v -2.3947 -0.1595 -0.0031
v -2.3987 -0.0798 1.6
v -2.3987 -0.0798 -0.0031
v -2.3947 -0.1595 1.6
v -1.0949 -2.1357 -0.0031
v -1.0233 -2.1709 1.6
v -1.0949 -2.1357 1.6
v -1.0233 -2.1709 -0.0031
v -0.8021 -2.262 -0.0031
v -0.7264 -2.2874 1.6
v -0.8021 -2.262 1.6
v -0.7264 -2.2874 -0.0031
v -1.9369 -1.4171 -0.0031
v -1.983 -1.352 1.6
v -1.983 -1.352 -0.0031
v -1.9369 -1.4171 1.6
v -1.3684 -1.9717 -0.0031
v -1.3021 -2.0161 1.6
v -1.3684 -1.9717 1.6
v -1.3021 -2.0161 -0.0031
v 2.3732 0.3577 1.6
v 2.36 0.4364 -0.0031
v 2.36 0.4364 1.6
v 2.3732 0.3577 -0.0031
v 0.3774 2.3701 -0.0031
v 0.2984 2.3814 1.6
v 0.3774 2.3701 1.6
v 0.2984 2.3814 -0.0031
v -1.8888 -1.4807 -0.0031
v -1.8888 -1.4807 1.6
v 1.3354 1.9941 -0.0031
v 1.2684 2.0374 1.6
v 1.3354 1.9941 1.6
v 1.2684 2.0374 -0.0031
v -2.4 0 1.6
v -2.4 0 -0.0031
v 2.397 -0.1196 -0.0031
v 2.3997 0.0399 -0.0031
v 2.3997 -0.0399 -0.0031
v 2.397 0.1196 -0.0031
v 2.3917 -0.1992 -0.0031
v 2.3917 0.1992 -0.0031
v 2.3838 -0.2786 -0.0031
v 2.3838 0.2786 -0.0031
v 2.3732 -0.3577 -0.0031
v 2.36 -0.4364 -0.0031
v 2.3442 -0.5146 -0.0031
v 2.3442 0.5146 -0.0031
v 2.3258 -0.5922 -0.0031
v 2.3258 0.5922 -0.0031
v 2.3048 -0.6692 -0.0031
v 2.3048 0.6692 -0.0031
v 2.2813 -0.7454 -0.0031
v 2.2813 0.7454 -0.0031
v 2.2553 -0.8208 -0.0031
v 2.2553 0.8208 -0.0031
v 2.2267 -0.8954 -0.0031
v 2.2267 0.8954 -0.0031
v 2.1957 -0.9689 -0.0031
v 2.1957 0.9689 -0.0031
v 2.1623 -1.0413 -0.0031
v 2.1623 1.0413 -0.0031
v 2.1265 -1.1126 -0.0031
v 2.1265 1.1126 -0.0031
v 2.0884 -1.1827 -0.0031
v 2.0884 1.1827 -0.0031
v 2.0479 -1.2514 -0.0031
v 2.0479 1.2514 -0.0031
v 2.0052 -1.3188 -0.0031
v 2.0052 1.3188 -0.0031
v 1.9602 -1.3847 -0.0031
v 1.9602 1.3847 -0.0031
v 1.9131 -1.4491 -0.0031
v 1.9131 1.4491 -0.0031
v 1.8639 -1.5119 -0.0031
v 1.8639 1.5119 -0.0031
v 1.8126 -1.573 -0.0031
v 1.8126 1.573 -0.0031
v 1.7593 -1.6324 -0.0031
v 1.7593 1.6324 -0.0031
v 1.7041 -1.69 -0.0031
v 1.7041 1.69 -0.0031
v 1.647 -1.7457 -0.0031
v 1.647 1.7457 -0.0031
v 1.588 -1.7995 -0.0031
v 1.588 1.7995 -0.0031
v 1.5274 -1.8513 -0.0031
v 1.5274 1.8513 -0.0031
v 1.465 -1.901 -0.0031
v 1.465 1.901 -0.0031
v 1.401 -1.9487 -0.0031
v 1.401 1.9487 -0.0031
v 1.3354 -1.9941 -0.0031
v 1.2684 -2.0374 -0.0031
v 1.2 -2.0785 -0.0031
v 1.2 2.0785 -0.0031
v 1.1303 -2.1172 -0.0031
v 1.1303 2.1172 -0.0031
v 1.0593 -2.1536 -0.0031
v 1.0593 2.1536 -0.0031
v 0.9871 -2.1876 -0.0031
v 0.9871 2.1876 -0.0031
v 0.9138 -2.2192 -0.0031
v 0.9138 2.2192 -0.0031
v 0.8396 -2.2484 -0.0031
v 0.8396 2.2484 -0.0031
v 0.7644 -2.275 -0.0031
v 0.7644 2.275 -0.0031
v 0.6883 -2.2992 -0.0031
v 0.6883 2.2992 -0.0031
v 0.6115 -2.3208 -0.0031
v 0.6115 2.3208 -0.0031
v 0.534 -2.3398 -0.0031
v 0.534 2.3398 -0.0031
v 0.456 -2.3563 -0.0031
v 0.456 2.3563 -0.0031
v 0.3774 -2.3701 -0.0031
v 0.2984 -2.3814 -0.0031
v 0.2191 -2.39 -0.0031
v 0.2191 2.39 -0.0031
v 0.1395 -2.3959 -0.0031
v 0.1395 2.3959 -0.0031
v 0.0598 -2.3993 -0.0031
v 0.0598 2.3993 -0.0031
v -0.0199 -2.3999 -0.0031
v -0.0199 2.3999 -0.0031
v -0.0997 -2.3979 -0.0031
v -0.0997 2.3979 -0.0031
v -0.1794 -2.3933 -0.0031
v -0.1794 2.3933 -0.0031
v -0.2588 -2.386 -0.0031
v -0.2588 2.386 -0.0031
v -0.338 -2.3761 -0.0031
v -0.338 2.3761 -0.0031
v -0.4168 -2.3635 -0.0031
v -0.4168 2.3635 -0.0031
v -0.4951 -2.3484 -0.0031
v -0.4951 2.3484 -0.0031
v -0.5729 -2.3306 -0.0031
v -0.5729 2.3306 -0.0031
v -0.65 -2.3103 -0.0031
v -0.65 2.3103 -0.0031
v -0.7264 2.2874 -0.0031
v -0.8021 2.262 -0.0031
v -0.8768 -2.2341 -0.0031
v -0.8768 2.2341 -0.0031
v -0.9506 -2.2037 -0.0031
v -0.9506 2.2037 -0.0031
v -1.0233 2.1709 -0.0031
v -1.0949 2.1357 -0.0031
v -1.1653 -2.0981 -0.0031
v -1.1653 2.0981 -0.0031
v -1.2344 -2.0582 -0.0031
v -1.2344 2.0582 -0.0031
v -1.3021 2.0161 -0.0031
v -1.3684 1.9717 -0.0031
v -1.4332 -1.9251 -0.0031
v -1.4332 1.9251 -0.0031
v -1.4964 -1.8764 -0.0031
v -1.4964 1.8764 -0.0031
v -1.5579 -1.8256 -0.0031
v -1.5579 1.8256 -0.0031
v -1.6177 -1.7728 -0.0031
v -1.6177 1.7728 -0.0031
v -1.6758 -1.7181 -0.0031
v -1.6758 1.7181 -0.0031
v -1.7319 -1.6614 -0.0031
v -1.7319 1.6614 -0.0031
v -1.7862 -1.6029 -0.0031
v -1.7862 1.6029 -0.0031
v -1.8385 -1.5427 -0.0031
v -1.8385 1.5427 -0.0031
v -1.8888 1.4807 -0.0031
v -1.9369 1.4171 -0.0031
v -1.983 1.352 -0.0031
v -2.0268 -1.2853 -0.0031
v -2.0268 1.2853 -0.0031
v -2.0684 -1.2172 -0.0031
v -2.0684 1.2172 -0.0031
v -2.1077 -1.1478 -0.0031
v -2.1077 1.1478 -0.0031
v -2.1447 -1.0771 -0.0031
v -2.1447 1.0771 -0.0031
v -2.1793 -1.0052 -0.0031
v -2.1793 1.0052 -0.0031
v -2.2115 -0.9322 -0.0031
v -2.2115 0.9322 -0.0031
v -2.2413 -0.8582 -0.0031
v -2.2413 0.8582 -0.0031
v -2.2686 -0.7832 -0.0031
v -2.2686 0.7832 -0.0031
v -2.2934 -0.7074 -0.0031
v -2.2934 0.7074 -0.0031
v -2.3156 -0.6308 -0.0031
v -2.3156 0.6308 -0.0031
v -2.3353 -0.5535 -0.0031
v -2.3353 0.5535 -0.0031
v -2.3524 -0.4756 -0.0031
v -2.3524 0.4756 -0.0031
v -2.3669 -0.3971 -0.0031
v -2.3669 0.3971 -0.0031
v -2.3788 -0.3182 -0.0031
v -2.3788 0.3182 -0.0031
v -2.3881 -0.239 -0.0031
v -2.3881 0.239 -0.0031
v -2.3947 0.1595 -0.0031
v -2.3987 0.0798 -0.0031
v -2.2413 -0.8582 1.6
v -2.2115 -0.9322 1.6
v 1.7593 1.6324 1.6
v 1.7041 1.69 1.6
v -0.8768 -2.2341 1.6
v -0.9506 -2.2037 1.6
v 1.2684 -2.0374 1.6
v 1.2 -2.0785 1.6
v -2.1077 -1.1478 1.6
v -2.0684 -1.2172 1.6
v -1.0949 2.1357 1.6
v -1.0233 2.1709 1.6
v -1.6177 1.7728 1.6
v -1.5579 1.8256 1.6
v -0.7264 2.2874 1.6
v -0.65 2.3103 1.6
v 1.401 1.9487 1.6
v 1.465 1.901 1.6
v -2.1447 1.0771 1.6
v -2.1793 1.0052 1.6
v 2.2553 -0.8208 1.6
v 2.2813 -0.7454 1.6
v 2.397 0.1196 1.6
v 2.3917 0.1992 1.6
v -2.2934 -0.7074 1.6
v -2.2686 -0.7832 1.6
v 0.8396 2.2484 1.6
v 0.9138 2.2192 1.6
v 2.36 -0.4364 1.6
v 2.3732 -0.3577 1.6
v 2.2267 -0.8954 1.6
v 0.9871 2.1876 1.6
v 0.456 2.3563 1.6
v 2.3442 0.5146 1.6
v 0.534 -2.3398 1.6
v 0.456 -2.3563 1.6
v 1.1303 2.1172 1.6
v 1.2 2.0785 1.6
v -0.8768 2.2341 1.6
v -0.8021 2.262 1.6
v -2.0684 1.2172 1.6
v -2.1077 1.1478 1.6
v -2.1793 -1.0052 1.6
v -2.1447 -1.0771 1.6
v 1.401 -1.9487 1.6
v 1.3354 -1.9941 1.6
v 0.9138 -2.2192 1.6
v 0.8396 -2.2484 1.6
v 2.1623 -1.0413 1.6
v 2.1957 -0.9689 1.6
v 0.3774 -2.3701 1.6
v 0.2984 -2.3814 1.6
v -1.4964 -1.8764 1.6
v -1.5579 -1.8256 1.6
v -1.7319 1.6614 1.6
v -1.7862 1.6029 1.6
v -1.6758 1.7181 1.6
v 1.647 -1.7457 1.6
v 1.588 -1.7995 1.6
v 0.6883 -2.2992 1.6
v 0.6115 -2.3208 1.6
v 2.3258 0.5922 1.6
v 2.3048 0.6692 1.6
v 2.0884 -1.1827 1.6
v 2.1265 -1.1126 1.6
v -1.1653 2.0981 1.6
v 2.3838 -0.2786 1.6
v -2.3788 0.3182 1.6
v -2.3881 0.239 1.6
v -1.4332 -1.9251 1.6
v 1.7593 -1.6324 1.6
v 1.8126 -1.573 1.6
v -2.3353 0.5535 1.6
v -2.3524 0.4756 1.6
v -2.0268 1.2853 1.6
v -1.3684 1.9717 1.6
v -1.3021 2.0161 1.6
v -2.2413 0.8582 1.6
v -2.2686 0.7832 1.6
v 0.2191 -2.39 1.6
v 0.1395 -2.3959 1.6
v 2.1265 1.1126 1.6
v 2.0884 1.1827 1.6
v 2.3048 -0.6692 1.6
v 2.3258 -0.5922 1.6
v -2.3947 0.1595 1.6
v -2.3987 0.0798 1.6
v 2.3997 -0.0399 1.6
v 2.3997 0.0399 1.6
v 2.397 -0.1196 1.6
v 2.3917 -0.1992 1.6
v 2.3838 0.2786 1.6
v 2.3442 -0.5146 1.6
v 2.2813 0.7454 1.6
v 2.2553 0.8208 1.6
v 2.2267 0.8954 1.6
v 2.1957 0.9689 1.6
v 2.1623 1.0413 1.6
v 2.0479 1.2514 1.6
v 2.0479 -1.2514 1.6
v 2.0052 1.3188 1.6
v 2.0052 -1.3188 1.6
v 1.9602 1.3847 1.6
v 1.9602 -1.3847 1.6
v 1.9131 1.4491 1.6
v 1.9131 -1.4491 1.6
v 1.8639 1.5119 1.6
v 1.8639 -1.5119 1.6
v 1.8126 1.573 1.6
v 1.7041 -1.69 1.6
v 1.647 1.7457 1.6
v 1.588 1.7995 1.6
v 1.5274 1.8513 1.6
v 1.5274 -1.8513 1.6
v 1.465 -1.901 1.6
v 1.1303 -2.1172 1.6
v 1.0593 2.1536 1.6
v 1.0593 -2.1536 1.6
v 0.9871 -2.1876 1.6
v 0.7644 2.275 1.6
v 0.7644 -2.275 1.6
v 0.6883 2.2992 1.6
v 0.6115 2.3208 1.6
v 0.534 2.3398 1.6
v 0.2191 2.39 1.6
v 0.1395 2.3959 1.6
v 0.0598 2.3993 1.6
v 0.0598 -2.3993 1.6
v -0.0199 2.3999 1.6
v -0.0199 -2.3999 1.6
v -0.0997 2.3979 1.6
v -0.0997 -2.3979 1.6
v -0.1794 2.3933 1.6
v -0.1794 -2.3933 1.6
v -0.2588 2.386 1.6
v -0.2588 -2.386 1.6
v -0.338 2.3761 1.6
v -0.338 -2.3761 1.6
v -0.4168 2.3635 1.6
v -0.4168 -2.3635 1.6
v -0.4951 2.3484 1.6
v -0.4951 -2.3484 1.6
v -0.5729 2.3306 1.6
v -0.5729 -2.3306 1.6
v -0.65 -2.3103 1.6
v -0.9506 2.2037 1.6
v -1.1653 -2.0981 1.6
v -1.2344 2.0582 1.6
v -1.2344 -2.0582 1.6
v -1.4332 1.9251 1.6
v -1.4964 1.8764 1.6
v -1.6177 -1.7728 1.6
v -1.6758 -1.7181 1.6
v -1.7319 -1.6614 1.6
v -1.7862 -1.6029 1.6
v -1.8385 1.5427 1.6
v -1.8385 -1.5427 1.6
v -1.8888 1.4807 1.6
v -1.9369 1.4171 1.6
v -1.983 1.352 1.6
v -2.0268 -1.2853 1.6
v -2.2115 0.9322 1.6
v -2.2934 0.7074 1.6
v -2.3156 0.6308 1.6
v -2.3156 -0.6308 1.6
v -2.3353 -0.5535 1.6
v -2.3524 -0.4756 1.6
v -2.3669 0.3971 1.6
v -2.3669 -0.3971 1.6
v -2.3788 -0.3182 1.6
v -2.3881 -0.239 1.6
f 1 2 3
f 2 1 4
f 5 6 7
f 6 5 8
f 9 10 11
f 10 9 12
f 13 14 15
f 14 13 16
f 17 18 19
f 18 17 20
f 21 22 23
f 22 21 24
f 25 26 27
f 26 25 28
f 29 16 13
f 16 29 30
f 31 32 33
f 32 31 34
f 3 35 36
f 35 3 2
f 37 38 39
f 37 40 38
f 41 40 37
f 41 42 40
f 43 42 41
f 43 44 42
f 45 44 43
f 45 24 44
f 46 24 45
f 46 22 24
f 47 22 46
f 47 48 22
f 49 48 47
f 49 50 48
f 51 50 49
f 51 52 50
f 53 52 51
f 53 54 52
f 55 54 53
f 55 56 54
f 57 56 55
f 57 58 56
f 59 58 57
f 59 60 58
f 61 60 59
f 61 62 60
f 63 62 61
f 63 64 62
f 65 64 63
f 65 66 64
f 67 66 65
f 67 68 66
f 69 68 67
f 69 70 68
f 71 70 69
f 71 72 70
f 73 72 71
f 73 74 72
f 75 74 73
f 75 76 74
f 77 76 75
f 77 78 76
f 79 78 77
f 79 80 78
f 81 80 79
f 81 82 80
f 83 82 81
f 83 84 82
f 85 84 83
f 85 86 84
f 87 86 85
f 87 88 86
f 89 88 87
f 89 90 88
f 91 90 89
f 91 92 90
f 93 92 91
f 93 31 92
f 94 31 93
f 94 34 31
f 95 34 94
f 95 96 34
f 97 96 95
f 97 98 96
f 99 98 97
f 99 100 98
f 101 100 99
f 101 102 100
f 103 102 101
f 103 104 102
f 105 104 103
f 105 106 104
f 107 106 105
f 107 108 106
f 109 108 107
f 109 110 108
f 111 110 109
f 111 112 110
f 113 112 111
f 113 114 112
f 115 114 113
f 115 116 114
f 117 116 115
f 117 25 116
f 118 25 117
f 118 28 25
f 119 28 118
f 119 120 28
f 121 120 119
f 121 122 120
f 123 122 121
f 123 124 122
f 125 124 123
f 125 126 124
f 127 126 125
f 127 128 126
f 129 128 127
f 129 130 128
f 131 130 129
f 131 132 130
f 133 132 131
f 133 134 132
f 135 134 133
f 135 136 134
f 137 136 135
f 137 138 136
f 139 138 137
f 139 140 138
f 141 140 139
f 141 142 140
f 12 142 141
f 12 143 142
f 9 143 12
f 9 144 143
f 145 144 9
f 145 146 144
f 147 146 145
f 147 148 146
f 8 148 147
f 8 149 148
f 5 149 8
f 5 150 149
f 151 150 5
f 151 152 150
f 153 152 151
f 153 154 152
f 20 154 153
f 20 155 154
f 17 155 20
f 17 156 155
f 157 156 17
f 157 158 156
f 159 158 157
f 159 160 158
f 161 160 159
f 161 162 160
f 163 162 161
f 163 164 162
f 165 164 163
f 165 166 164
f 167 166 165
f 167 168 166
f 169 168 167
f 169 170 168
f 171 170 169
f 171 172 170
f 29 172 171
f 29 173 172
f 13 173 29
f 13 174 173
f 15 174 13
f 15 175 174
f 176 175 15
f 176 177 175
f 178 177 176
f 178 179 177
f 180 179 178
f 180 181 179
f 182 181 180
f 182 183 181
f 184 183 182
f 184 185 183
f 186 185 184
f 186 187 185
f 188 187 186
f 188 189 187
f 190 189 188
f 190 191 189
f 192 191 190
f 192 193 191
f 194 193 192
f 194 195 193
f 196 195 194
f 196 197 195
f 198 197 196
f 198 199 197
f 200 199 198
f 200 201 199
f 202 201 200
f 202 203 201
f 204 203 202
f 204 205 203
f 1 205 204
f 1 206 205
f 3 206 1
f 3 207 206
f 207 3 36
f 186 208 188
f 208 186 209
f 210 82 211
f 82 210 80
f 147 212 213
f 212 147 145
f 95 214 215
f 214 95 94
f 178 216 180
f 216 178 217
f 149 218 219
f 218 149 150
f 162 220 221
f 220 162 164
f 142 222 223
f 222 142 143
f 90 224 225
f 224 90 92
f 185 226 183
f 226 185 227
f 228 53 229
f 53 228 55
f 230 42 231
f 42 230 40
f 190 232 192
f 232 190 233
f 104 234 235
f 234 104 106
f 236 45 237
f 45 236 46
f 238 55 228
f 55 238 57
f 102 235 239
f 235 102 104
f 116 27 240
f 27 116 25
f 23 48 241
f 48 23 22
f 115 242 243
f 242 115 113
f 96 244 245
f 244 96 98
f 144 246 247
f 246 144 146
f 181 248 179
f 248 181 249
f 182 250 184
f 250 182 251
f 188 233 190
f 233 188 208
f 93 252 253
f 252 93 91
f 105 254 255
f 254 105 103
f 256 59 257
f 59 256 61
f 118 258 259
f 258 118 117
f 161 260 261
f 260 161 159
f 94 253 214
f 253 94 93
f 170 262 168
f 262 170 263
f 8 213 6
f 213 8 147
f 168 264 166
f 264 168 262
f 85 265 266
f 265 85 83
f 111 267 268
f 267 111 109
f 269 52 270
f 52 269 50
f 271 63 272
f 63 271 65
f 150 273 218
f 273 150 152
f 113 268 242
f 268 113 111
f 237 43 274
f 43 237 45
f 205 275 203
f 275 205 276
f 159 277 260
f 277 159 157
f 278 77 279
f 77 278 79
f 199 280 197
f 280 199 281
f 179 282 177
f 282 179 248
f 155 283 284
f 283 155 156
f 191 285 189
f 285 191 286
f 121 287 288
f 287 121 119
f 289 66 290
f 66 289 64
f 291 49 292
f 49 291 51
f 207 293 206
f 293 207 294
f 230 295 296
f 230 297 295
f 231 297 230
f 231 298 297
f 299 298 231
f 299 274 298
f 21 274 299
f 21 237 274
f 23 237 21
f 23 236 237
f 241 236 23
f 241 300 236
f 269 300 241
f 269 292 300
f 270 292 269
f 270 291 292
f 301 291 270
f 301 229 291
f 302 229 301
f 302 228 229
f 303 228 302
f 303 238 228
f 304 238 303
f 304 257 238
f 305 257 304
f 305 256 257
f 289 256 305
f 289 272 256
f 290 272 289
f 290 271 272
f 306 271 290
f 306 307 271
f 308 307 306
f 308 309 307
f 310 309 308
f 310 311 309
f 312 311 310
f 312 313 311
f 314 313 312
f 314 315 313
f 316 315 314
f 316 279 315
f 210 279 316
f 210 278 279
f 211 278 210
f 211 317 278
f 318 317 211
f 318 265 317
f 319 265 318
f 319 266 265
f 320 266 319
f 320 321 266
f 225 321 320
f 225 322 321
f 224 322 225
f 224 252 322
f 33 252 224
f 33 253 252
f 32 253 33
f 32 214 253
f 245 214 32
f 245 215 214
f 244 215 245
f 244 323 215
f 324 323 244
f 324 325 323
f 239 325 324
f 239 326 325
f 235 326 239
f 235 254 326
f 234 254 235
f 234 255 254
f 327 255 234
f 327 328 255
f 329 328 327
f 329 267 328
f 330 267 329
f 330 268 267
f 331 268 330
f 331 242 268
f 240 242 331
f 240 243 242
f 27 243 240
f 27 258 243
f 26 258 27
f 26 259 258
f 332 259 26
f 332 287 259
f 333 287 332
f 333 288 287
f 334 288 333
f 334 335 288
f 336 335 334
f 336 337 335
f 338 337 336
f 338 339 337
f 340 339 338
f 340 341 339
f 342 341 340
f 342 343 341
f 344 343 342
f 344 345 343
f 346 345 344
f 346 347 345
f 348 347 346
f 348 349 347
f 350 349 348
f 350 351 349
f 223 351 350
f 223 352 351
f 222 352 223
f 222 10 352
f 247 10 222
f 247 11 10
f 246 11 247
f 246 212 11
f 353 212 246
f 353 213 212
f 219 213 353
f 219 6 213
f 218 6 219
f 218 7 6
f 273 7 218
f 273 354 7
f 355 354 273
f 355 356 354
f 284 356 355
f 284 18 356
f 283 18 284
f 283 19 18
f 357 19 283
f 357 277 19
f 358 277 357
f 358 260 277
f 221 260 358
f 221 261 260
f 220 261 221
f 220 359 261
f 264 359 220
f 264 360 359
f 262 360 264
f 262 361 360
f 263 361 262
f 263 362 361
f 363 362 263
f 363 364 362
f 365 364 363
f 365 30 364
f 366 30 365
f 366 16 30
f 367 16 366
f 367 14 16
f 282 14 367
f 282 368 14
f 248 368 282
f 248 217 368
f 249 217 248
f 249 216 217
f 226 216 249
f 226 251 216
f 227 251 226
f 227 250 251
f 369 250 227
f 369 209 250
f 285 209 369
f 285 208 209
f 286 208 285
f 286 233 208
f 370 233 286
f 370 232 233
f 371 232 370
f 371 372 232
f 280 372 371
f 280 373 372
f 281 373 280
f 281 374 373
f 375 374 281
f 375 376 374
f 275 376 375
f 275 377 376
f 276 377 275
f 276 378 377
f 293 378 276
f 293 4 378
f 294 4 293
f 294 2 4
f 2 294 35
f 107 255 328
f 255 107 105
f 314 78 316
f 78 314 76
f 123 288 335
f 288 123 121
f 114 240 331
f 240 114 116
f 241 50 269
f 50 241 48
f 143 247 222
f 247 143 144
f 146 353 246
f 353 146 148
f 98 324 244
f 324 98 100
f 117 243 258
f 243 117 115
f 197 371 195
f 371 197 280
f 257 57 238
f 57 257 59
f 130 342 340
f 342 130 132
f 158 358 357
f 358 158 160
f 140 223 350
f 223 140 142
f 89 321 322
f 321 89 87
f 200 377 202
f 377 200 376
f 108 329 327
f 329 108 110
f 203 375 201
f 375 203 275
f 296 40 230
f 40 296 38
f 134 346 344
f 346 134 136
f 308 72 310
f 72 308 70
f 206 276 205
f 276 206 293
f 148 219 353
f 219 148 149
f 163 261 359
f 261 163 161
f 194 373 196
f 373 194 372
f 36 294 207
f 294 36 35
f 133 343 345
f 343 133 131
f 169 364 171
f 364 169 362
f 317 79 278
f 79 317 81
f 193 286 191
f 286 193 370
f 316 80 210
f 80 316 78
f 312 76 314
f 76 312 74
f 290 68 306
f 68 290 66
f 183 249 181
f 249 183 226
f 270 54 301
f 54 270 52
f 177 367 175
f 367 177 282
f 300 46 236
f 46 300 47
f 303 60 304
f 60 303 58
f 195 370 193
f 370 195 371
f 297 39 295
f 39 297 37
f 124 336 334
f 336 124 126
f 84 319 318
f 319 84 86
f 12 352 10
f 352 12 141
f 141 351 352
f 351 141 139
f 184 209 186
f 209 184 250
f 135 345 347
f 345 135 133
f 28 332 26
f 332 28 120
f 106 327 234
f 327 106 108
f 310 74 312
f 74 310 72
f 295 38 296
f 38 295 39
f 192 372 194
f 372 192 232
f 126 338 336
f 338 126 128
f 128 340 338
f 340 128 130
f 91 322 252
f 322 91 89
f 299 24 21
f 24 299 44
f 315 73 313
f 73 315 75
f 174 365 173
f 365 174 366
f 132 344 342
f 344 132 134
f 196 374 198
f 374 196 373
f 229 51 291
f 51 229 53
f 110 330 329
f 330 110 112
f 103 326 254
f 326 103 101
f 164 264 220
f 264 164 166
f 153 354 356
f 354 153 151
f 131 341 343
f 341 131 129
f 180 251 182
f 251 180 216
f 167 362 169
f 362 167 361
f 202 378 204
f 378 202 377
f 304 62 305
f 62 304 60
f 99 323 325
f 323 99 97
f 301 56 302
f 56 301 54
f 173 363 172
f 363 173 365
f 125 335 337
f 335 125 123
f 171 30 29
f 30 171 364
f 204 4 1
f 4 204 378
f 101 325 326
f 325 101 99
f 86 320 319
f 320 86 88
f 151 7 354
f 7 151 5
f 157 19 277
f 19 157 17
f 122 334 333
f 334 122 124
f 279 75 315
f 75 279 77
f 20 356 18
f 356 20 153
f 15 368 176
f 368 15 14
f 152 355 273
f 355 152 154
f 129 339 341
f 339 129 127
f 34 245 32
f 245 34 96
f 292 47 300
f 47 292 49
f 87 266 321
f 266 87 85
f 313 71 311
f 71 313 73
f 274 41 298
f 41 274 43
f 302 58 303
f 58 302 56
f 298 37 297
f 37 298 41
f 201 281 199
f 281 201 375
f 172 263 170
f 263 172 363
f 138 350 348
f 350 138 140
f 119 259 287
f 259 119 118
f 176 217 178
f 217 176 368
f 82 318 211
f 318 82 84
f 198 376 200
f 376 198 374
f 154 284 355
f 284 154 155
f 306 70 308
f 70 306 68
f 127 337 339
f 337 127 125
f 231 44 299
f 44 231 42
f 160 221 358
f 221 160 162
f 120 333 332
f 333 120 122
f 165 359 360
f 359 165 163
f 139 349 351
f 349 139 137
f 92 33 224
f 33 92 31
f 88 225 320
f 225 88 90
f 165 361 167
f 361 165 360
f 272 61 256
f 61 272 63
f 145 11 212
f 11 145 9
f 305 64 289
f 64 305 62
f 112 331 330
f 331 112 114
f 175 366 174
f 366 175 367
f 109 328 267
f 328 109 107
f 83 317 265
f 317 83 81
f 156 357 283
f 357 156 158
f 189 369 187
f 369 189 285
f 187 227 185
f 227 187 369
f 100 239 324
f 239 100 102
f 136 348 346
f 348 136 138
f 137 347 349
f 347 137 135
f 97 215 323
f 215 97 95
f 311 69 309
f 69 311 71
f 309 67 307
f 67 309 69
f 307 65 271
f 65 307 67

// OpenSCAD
// file: ../p/4-4edge.scad
use <../lib.scad>
$fa=1; $fs=0.2;
function ldraw_lib__4_4edge(realsolid=false) = [
// 0 Circle 1.0
// 0 Name: 4-4edge.dat
// 0 Author: James Jessiman
// 0 !LDRAW_ORG Primitive UPDATE 2017-01
// 0 !LICENSE Licensed under CC BY 2.0 and CC BY 4.0 : see CAreadme.txt
// 
// 0 BFC CERTIFY CCW
  [0,"BFC","CERTIFY"],
  [0,"BFC","CCW"],
// 
// 0 !HISTORY 1998-12-15 [PTadmin] Official Update 1998-10
// 0 !HISTORY 2005-12-28 [PTadmin] Official Update 2005-01
// 0 !HISTORY 2007-06-24 [PTadmin] Header formatted for Contributor Agreement
// 0 !HISTORY 2008-07-01 [PTadmin] Official Update 2008-01
// 0 !HISTORY 2017-01-15 [Steffen] BFCed
// 0 !HISTORY 2017-12-30 [PTadmin] Official Update 2017-01
// 
// 
// 2 24 1 0 0 0.9239 0 0.3827
  [2,24,1,0,0,0.9239,0,0.3827],
// 2 24 0.9239 0 0.3827 0.7071 0 0.7071
  [2,24,0.9239,0,0.3827,0.7071,0,0.7071],
// 2 24 0.7071 0 0.7071 0.3827 0 0.9239
  [2,24,0.7071,0,0.7071,0.3827,0,0.9239],
// 2 24 0.3827 0 0.9239 0 0 1
  [2,24,0.3827,0,0.9239,0,0,1],
// 2 24 0 0 1 -0.3827 0 0.9239
  [2,24,0,0,1,-0.3827,0,0.9239],
// 2 24 -0.3827 0 0.9239 -0.7071 0 0.7071
  [2,24,-0.3827,0,0.9239,-0.7071,0,0.7071],
// 2 24 -0.7071 0 0.7071 -0.9239 0 0.3827
  [2,24,-0.7071,0,0.7071,-0.9239,0,0.3827],
// 2 24 -0.9239 0 0.3827 -1 0 -0
  [2,24,-0.9239,0,0.3827,-1,0,-0],
// 2 24 -1 0 -0 -0.9239 0 -0.3827
  [2,24,-1,0,-0,-0.9239,0,-0.3827],
// 2 24 -0.9239 0 -0.3827 -0.7071 0 -0.7071
  [2,24,-0.9239,0,-0.3827,-0.7071,0,-0.7071],
// 2 24 -0.7071 0 -0.7071 -0.3827 0 -0.9239
  [2,24,-0.7071,0,-0.7071,-0.3827,0,-0.9239],
// 2 24 -0.3827 0 -0.9239 0 0 -1
  [2,24,-0.3827,0,-0.9239,0,0,-1],
// 2 24 0 0 -1 0.3827 0 -0.9239
  [2,24,0,0,-1,0.3827,0,-0.9239],
// 2 24 0.3827 0 -0.9239 0.7071 0 -0.7071
  [2,24,0.3827,0,-0.9239,0.7071,0,-0.7071],
// 2 24 0.7071 0 -0.7071 0.9239 0 -0.3827
  [2,24,0.7071,0,-0.7071,0.9239,0,-0.3827],
// 2 24 0.9239 0 -0.3827 1 0 0
  [2,24,0.9239,0,-0.3827,1,0,0],
];
module ldraw_lib__4_4edge(step=0, col=false, unit=2/5, alt=false, line=0.2, solid=!$preview)
    makepoly(ldraw_lib__4_4edge(solid), step=step, col=col, unit=unit, alt=alt, line=line, solid=solid);
ldraw_lib__4_4edge(line=0.2);
// file: ../p/4-4disc.scad
use <../lib.scad>
$fa=1; $fs=0.2;
function ldraw_lib__4_4disc(realsolid=false) = [
// 0 Disc 1.0
// 0 Name: 4-4disc.dat
// 0 Author: James Jessiman
// 0 !LDRAW_ORG Primitive UPDATE 2002-02
// 0 !LICENSE Licensed under CC BY 2.0 and CC BY 4.0 : see CAreadme.txt
// 
// 0 BFC CERTIFY CCW
  [0,"BFC","CERTIFY"],
  [0,"BFC","CCW"],
// 
// 0 !HISTORY 1998-12-15 [PTadmin] Official Update 1998-10
// 0 !HISTORY 2002-03-23 [sbliss] Added BFC statement
// 0 !HISTORY 2002-04-25 [PTadmin] Official Update 2002-02
// 0 !HISTORY 2007-06-24 [PTadmin] Header formatted for Contributor Agreement
// 0 !HISTORY 2008-07-01 [PTadmin] Official Update 2008-01
// 
// 
// 3 16 0 0 0 1 0 0 0.9239 0 0.3827
  [3,16,0,0,0,1,0,0,0.9239,0,0.3827],
// 3 16 0 0 0 0.9239 0 0.3827 0.7071 0 0.7071
  [3,16,0,0,0,0.9239,0,0.3827,0.7071,0,0.7071],
// 3 16 0 0 0 0.7071 0 0.7071 0.3827 0 0.9239
  [3,16,0,0,0,0.7071,0,0.7071,0.3827,0,0.9239],
// 3 16 0 0 0 0.3827 0 0.9239 0 0 1
  [3,16,0,0,0,0.3827,0,0.9239,0,0,1],
// 3 16 0 0 0 0 0 1 -0.3827 0 0.9239
  [3,16,0,0,0,0,0,1,-0.3827,0,0.9239],
// 3 16 0 0 0 -0.3827 0 0.9239 -0.7071 0 0.7071
  [3,16,0,0,0,-0.3827,0,0.9239,-0.7071,0,0.7071],
// 3 16 0 0 0 -0.7071 0 0.7071 -0.9239 0 0.3827
  [3,16,0,0,0,-0.7071,0,0.7071,-0.9239,0,0.3827],
// 3 16 0 0 0 -0.9239 0 0.3827 -1 0 -0
  [3,16,0,0,0,-0.9239,0,0.3827,-1,0,-0],
// 3 16 0 0 0 -1 0 -0 -0.9239 0 -0.3827
  [3,16,0,0,0,-1,0,-0,-0.9239,0,-0.3827],
// 3 16 0 0 0 -0.9239 0 -0.3827 -0.7071 0 -0.7071
  [3,16,0,0,0,-0.9239,0,-0.3827,-0.7071,0,-0.7071],
// 3 16 0 0 0 -0.7071 0 -0.7071 -0.3827 0 -0.9239
  [3,16,0,0,0,-0.7071,0,-0.7071,-0.3827,0,-0.9239],
// 3 16 0 0 0 -0.3827 0 -0.9239 0 0 -1
  [3,16,0,0,0,-0.3827,0,-0.9239,0,0,-1],
// 3 16 0 0 0 0 0 -1 0.3827 0 -0.9239
  [3,16,0,0,0,0,0,-1,0.3827,0,-0.9239],
// 3 16 0 0 0 0.3827 0 -0.9239 0.7071 0 -0.7071
  [3,16,0,0,0,0.3827,0,-0.9239,0.7071,0,-0.7071],
// 3 16 0 0 0 0.7071 0 -0.7071 0.9239 0 -0.3827
  [3,16,0,0,0,0.7071,0,-0.7071,0.9239,0,-0.3827],
// 3 16 0 0 0 0.9239 0 -0.3827 1 0 0
  [3,16,0,0,0,0.9239,0,-0.3827,1,0,0],
// 0
];
module ldraw_lib__4_4disc(step=0, col=false, unit=2/5, alt=false, line=0.2, solid=!$preview)
    makepoly(ldraw_lib__4_4disc(solid), step=step, col=col, unit=unit, alt=alt, line=line, solid=solid);
ldraw_lib__4_4disc(line=0.2);
// file: ../p/4-4cyli.scad
use <../lib.scad>
$fa=1; $fs=0.2;
function ldraw_lib__4_4cyli(realsolid=false) = [
// 0 Cylinder 1.0
// 0 Name: 4-4cyli.dat
// 0 Author: James Jessiman
// 0 !LDRAW_ORG Primitive UPDATE 2005-01
// 0 !LICENSE Licensed under CC BY 2.0 and CC BY 4.0 : see CAreadme.txt
// 
// 0 BFC CERTIFY CCW
  [0,"BFC","CERTIFY"],
  [0,"BFC","CCW"],
// 
// 0 !HISTORY 1998-12-15 [PTadmin] Official Update 1998-10
// 0 !HISTORY 2002-03-23 [sbliss] Added BFC statement; merged headers from files in distributions LDraw 0.27 and Complete.
// 0 !HISTORY 2002-04-25 [PTadmin] Official Update 2002-02
// 0 !HISTORY 2004-12-14 [guyvivan] BFC CCW
// 0 !HISTORY 2005-12-28 [PTadmin] Official Update 2005-01
// 0 !HISTORY 2007-06-24 [PTadmin] Header formatted for Contributor Agreement
// 0 !HISTORY 2008-07-01 [PTadmin] Official Update 2008-01
// 
// 
// 4 16 1 1 0 0.9239 1 0.3827 0.9239 0 0.3827 1 0 0
  [4,16,1,1,0,0.9239,1,0.3827,0.9239,0,0.3827,1,0,0],
// 5 24 1 0 0 1 1 0 0.9239 0 0.3827 0.9239 0 -0.3827
  [5,24,1,0,0,1,1,0,0.9239,0,0.3827,0.9239,0,-0.3827],
// 4 16 0.9239 1 0.3827 0.7071 1 0.7071 0.7071 0 0.7071 0.9239 0 0.3827
  [4,16,0.9239,1,0.3827,0.7071,1,0.7071,0.7071,0,0.7071,0.9239,0,0.3827],
// 5 24 0.9239 0 0.3827 0.9239 1 0.3827 0.7071 0 0.7071 1 0 0
  [5,24,0.9239,0,0.3827,0.9239,1,0.3827,0.7071,0,0.7071,1,0,0],
// 4 16 0.7071 1 0.7071 0.3827 1 0.9239 0.3827 0 0.9239 0.7071 0 0.7071
  [4,16,0.7071,1,0.7071,0.3827,1,0.9239,0.3827,0,0.9239,0.7071,0,0.7071],
// 5 24 0.7071 0 0.7071 0.7071 1 0.7071 0.3827 0 0.9239 0.9239 0 0.3827
  [5,24,0.7071,0,0.7071,0.7071,1,0.7071,0.3827,0,0.9239,0.9239,0,0.3827],
// 4 16 0.3827 1 0.9239 0 1 1 0 0 1 0.3827 0 0.9239
  [4,16,0.3827,1,0.9239,0,1,1,0,0,1,0.3827,0,0.9239],
// 5 24 0.3827 0 0.9239 0.3827 1 0.9239 0 0 1 0.7071 0 0.7071
  [5,24,0.3827,0,0.9239,0.3827,1,0.9239,0,0,1,0.7071,0,0.7071],
// 4 16 0 1 1 -0.3827 1 0.9239 -0.3827 0 0.9239 0 0 1
  [4,16,0,1,1,-0.3827,1,0.9239,-0.3827,0,0.9239,0,0,1],
// 5 24 0 0 1 0 1 1 -0.3827 0 0.9239 0.3827 0 0.9239
  [5,24,0,0,1,0,1,1,-0.3827,0,0.9239,0.3827,0,0.9239],
// 4 16 -0.3827 1 0.9239 -0.7071 1 0.7071 -0.7071 0 0.7071 -0.3827 0 0.9239
  [4,16,-0.3827,1,0.9239,-0.7071,1,0.7071,-0.7071,0,0.7071,-0.3827,0,0.9239],
// 5 24 -0.3827 0 0.9239 -0.3827 1 0.9239 -0.7071 0 0.7071 0 0 1
  [5,24,-0.3827,0,0.9239,-0.3827,1,0.9239,-0.7071,0,0.7071,0,0,1],
// 4 16 -0.7071 1 0.7071 -0.9239 1 0.3827 -0.9239 0 0.3827 -0.7071 0 0.7071
  [4,16,-0.7071,1,0.7071,-0.9239,1,0.3827,-0.9239,0,0.3827,-0.7071,0,0.7071],
// 5 24 -0.7071 0 0.7071 -0.7071 1 0.7071 -0.9239 0 0.3827 -0.3827 0 0.9239
  [5,24,-0.7071,0,0.7071,-0.7071,1,0.7071,-0.9239,0,0.3827,-0.3827,0,0.9239],
// 4 16 -0.9239 1 0.3827 -1 1 0 -1 0 0 -0.9239 0 0.3827
  [4,16,-0.9239,1,0.3827,-1,1,0,-1,0,0,-0.9239,0,0.3827],
// 5 24 -0.9239 0 0.3827 -0.9239 1 0.3827 -1 0 0 -0.7071 0 0.7071
  [5,24,-0.9239,0,0.3827,-0.9239,1,0.3827,-1,0,0,-0.7071,0,0.7071],
// 4 16 -1 1 0 -0.9239 1 -0.3827 -0.9239 0 -0.3827 -1 0 0
  [4,16,-1,1,0,-0.9239,1,-0.3827,-0.9239,0,-0.3827,-1,0,0],
// 5 24 -1 0 0 -1 1 0 -0.9239 0 -0.3827 -0.9239 0 0.3827
  [5,24,-1,0,0,-1,1,0,-0.9239,0,-0.3827,-0.9239,0,0.3827],
// 4 16 -0.9239 1 -0.3827 -0.7071 1 -0.7071 -0.7071 0 -0.7071 -0.9239 0 -0.3827
  [4,16,-0.9239,1,-0.3827,-0.7071,1,-0.7071,-0.7071,0,-0.7071,-0.9239,0,-0.3827],
// 5 24 -0.9239 0 -0.3827 -0.9239 1 -0.3827 -0.7071 0 -0.7071 -1 0 0
  [5,24,-0.9239,0,-0.3827,-0.9239,1,-0.3827,-0.7071,0,-0.7071,-1,0,0],
// 4 16 -0.7071 1 -0.7071 -0.3827 1 -0.9239 -0.3827 0 -0.9239 -0.7071 0 -0.7071
  [4,16,-0.7071,1,-0.7071,-0.3827,1,-0.9239,-0.3827,0,-0.9239,-0.7071,0,-0.7071],
// 5 24 -0.7071 0 -0.7071 -0.7071 1 -0.7071 -0.3827 0 -0.9239 -0.9239 0 -0.3827
  [5,24,-0.7071,0,-0.7071,-0.7071,1,-0.7071,-0.3827,0,-0.9239,-0.9239,0,-0.3827],
// 4 16 -0.3827 1 -0.9239 0 1 -1 0 0 -1 -0.3827 0 -0.9239
  [4,16,-0.3827,1,-0.9239,0,1,-1,0,0,-1,-0.3827,0,-0.9239],
// 5 24 -0.3827 0 -0.9239 -0.3827 1 -0.9239 0 0 -1 -0.7071 0 -0.7071
  [5,24,-0.3827,0,-0.9239,-0.3827,1,-0.9239,0,0,-1,-0.7071,0,-0.7071],
// 4 16 0 1 -1 0.3827 1 -0.9239 0.3827 0 -0.9239 0 0 -1
  [4,16,0,1,-1,0.3827,1,-0.9239,0.3827,0,-0.9239,0,0,-1],
// 5 24 0 0 -1 0 1 -1 0.3827 0 -0.9239 -0.3827 0 -0.9239
  [5,24,0,0,-1,0,1,-1,0.3827,0,-0.9239,-0.3827,0,-0.9239],
// 4 16 0.3827 1 -0.9239 0.7071 1 -0.7071 0.7071 0 -0.7071 0.3827 0 -0.9239
  [4,16,0.3827,1,-0.9239,0.7071,1,-0.7071,0.7071,0,-0.7071,0.3827,0,-0.9239],
// 5 24 0.3827 0 -0.9239 0.3827 1 -0.9239 0.7071 0 -0.7071 0 0 -1
  [5,24,0.3827,0,-0.9239,0.3827,1,-0.9239,0.7071,0,-0.7071,0,0,-1],
// 4 16 0.7071 1 -0.7071 0.9239 1 -0.3827 0.9239 0 -0.3827 0.7071 0 -0.7071
  [4,16,0.7071,1,-0.7071,0.9239,1,-0.3827,0.9239,0,-0.3827,0.7071,0,-0.7071],
// 5 24 0.7071 0 -0.7071 0.7071 1 -0.7071 0.9239 0 -0.3827 0.3827 0 -0.9239
  [5,24,0.7071,0,-0.7071,0.7071,1,-0.7071,0.9239,0,-0.3827,0.3827,0,-0.9239],
// 4 16 0.9239 1 -0.3827 1 1 0 1 0 0 0.9239 0 -0.3827
  [4,16,0.9239,1,-0.3827,1,1,0,1,0,0,0.9239,0,-0.3827],
// 5 24 0.9239 0 -0.3827 0.9239 1 -0.3827 1 0 0 0.7071 0 -0.7071
  [5,24,0.9239,0,-0.3827,0.9239,1,-0.3827,1,0,0,0.7071,0,-0.7071],
// 0
];
module ldraw_lib__4_4cyli(step=0, col=false, unit=2/5, alt=false, line=0.2, solid=!$preview)
    makepoly(ldraw_lib__4_4cyli(solid), step=step, col=col, unit=unit, alt=alt, line=line, solid=solid);
ldraw_lib__4_4cyli(line=0.2);
// file: ../p/stud3.scad
use <../lib.scad>
use <4-4cyli.scad>
use <4-4disc.scad>
use <4-4edge.scad>
$fa=1; $fs=0.2;
function ldraw_lib__stud3(realsolid=false) = realsolid ? 
    [openscad(translate([0,0,-eps()], o=cylinder(4+eps(), r=4)),2)] : [
// 0 Stud Tube Solid
// 0 Name: stud3.dat
// 0 Author: James Jessiman
// 0 !LDRAW_ORG Primitive UPDATE 2012-01
// 0 !LICENSE Licensed under CC BY 2.0 and CC BY 4.0 : see CAreadme.txt
// 
// 0 BFC CERTIFY CCW
  [0,"BFC","CERTIFY"],
  [0,"BFC","CCW"],
// 
// 0 !HISTORY 2002-04-04 [sbliss] Modified for BFC compliance
// 0 !HISTORY 2002-04-25 [PTadmin] Official Update 2002-02
// 0 !HISTORY 2007-06-24 [PTadmin] Header formatted for Contributor Agreement
// 0 !HISTORY 2008-07-01 [PTadmin] Official Update 2008-01
// 0 !HISTORY 2012-02-16 [Philo] Changed to CCW
// 0 !HISTORY 2012-03-30 [PTadmin] Official Update 2012-01
// 
// 
// 1 16 0 -4 0 4 0 0 0 1 0 0 0 4 4-4edge.dat
  [1,16,0,-4,0,4,0,0,0,1,0,0,0,4, ldraw_lib__4_4edge(realsolid)],
// 1 16 0 0 0 4 0 0 0 1 0 0 0 4 4-4edge.dat
  [1,16,0,0,0,4,0,0,0,1,0,0,0,4, ldraw_lib__4_4edge(realsolid)],
// 1 16 0 -4 0 4 0 0 0 1 0 0 0 4 4-4disc.dat
  [1,16,0,-4,0,4,0,0,0,1,0,0,0,4, ldraw_lib__4_4disc(realsolid)],
// 1 16 0 -4 0 4 0 0 0 4 0 0 0 4 4-4cyli.dat
  [1,16,0,-4,0,4,0,0,0,4,0,0,0,4, ldraw_lib__4_4cyli(realsolid)],
];
module ldraw_lib__stud3(step=0, col=false, unit=2/5, alt=false, line=0.2, solid=!$preview)
    makepoly(ldraw_lib__stud3(solid), step=step, col=col, unit=unit, alt=alt, line=line, solid=solid);
ldraw_lib__stud3(line=0.2);
// file: ../p/stud.scad
use <../lib.scad>
use <4-4cyli.scad>
use <4-4disc.scad>
use <4-4edge.scad>
$fa=1; $fs=0.2;
function ldraw_lib__stud(realsolid=false) = realsolid ? 
    [openscad(translate([0,0,-eps()], o=cylinder(4+eps(), r=6)),2)] : [
// 0 Stud
// 0 Name: stud.dat
// 0 Author: James Jessiman
// 0 !LDRAW_ORG Primitive UPDATE 2012-01
// 0 !LICENSE Licensed under CC BY 2.0 and CC BY 4.0 : see CAreadme.txt
// 
// 0 BFC CERTIFY CCW
  [0,"BFC","CERTIFY"],
  [0,"BFC","CCW"],
// 
// 0 !HISTORY 2002-04-04 [sbliss] Modified for BFC compliance
// 0 !HISTORY 2002-04-25 [PTadmin] Official Update 2002-02
// 0 !HISTORY 2007-06-24 [PTadmin] Header formatted for Contributor Agreement
// 0 !HISTORY 2008-07-01 [PTadmin] Official Update 2008-01
// 0 !HISTORY 2012-02-16 [Philo] Changed to CCW
// 0 !HISTORY 2012-03-30 [PTadmin] Official Update 2012-01
// 
// 
// 1 16 0 0 0 6 0 0 0 1 0 0 0 6 4-4edge.dat
  [1,16,0,0,0,6,0,0,0,1,0,0,0,6, ldraw_lib__4_4edge(realsolid)],
// 1 16 0 -4 0 6 0 0 0 1 0 0 0 6 4-4edge.dat
  [1,16,0,-4,0,6,0,0,0,1,0,0,0,6, ldraw_lib__4_4edge(realsolid)],
// 1 16 0 0 0 6 0 0 0 -4 0 0 0 6 4-4cyli.dat
  [1,16,0,0,0,6,0,0,0,-4,0,0,0,6, ldraw_lib__4_4cyli(realsolid)],
// 1 16 0 -4 0 6 0 0 0 1 0 0 0 6 4-4disc.dat
  [1,16,0,-4,0,6,0,0,0,1,0,0,0,6, ldraw_lib__4_4disc(realsolid)],
];
module ldraw_lib__stud(step=0, col=false, unit=2/5, alt=false, line=0.2, solid=!$preview)
    makepoly(ldraw_lib__stud(solid), step=step, col=col, unit=unit, alt=alt, line=line, solid=solid);
ldraw_lib__stud(line=0.2);
// file: ../p/box5.scad
use <../lib.scad>
$fa=1; $fs=0.2;
function ldraw_lib__box5(realsolid=false) = [
// 0 Box with 5 Faces and All Edges
// 0 Name: box5.dat
// 0 Author: James Jessiman
// 0 !LDRAW_ORG Primitive UPDATE 2012-01
// 0 !LICENSE Licensed under CC BY 2.0 and CC BY 4.0 : see CAreadme.txt
// 
// 0 BFC CERTIFY CCW
  [0,"BFC","CERTIFY"],
  [0,"BFC","CCW"],
// 
// 0 !HISTORY 2002-04-03 [sbliss] Modified for BFC compliance
// 0 !HISTORY 2002-04-25 [PTadmin] Official Update 2002-02
// 0 !HISTORY 2007-06-24 [PTadmin] Header formatted for Contributor Agreement
// 0 !HISTORY 2008-07-01 [PTadmin] Official Update 2008-01
// 0 !HISTORY 2012-02-16 [Philo] Changed to CCW
// 0 !HISTORY 2012-03-30 [PTadmin] Official Update 2012-01
// 
// 
// 2 24 1 1 1 -1 1 1
  [2,24,1,1,1,-1,1,1],
// 2 24 -1 1 1 -1 1 -1
  [2,24,-1,1,1,-1,1,-1],
// 2 24 -1 1 -1 1 1 -1
  [2,24,-1,1,-1,1,1,-1],
// 2 24 1 1 -1 1 1 1
  [2,24,1,1,-1,1,1,1],
// 2 24 1 0 1 -1 0 1
  [2,24,1,0,1,-1,0,1],
// 2 24 -1 0 1 -1 0 -1
  [2,24,-1,0,1,-1,0,-1],
// 2 24 -1 0 -1 1 0 -1
  [2,24,-1,0,-1,1,0,-1],
// 2 24 1 0 -1 1 0 1
  [2,24,1,0,-1,1,0,1],
// 2 24 1 0 1 1 1 1
  [2,24,1,0,1,1,1,1],
// 2 24 -1 0 1 -1 1 1
  [2,24,-1,0,1,-1,1,1],
// 2 24 1 0 -1 1 1 -1
  [2,24,1,0,-1,1,1,-1],
// 2 24 -1 0 -1 -1 1 -1
  [2,24,-1,0,-1,-1,1,-1],
// 4 16 -1 1 1 1 1 1 1 1 -1 -1 1 -1
  [4,16,-1,1,1,1,1,1,1,1,-1,-1,1,-1],
// 4 16 -1 1 1 -1 0 1 1 0 1 1 1 1
  [4,16,-1,1,1,-1,0,1,1,0,1,1,1,1],
// 4 16 -1 1 -1 -1 0 -1 -1 0 1 -1 1 1
  [4,16,-1,1,-1,-1,0,-1,-1,0,1,-1,1,1],
// 4 16 1 1 -1 1 0 -1 -1 0 -1 -1 1 -1
  [4,16,1,1,-1,1,0,-1,-1,0,-1,-1,1,-1],
// 4 16 1 1 1 1 0 1 1 0 -1 1 1 -1
  [4,16,1,1,1,1,0,1,1,0,-1,1,1,-1],
];
module ldraw_lib__box5(step=0, col=false, unit=2/5, alt=false, line=0.2, solid=!$preview)
    makepoly(ldraw_lib__box5(solid), step=step, col=col, unit=unit, alt=alt, line=line, solid=solid);
ldraw_lib__box5(line=0.2);
// file: ../p/box4t.scad
use <../lib.scad>
$fa=1; $fs=0.2;
function ldraw_lib__box4t(realsolid=false) = [
// 0 Box with 4 Adjacent Faces and All Edges
// 0 Name: box4t.dat
// 0 Author: Tore Eriksson [Tore_Eriksson]
// 0 !LDRAW_ORG Primitive UPDATE 2003-02
// 0 !LICENSE Licensed under CC BY 2.0 and CC BY 4.0 : see CAreadme.txt
// 
// 0 BFC CERTIFY CCW
  [0,"BFC","CERTIFY"],
  [0,"BFC","CCW"],
// 
// 0 !HISTORY 1997-09-29 [PTadmin] Official Update 1997-15
// 0 !HISTORY 2002-08-31 [izanette] Modified with WINDZ for BFC compliance
// 0 !HISTORY 2003-08-01 [PTadmin] Official Update 2003-02
// 0 !HISTORY 2007-06-24 [PTadmin] Header formatted for Contributor Agreement
// 0 !HISTORY 2008-07-01 [PTadmin] Official Update 2008-01
// 
// 
// 2 24 1 1 1 -1 1 1
  [2,24,1,1,1,-1,1,1],
// 2 24 -1 1 1 -1 1 -1
  [2,24,-1,1,1,-1,1,-1],
// 2 24 -1 1 -1 1 1 -1
  [2,24,-1,1,-1,1,1,-1],
// 2 24 1 1 -1 1 1 1
  [2,24,1,1,-1,1,1,1],
// 2 24 1 0 1 -1 0 1
  [2,24,1,0,1,-1,0,1],
// 2 24 -1 0 1 -1 0 -1
  [2,24,-1,0,1,-1,0,-1],
// 2 24 -1 0 -1 1 0 -1
  [2,24,-1,0,-1,1,0,-1],
// 2 24 1 0 -1 1 0 1
  [2,24,1,0,-1,1,0,1],
// 2 24 1 0 1 1 1 1
  [2,24,1,0,1,1,1,1],
// 2 24 -1 0 1 -1 1 1
  [2,24,-1,0,1,-1,1,1],
// 2 24 1 0 -1 1 1 -1
  [2,24,1,0,-1,1,1,-1],
// 2 24 -1 0 -1 -1 1 -1
  [2,24,-1,0,-1,-1,1,-1],
// 4 16 1 1 1 1 1 -1 -1 1 -1 -1 1 1
  [4,16,1,1,1,1,1,-1,-1,1,-1,-1,1,1],
// 4 16 1 1 1 -1 1 1 -1 0 1 1 0 1
  [4,16,1,1,1,-1,1,1,-1,0,1,1,0,1],
// 4 16 -1 1 1 -1 1 -1 -1 0 -1 -1 0 1
  [4,16,-1,1,1,-1,1,-1,-1,0,-1,-1,0,1],
// 0 4 16 -1 1 -1 -1 0 -1 1 0 -1 1 1 -1
// 4 16 1 1 -1 1 1 1 1 0 1 1 0 -1
  [4,16,1,1,-1,1,1,1,1,0,1,1,0,-1],
// 0
];
module ldraw_lib__box4t(step=0, col=false, unit=2/5, alt=false, line=0.2, solid=!$preview)
    makepoly(ldraw_lib__box4t(solid), step=step, col=col, unit=unit, alt=alt, line=line, solid=solid);
ldraw_lib__box4t(line=0.2);
// file: s/3004s01.scad
use <../../lib.scad>
use <../../p/box4t.scad>
use <../../p/box5.scad>
use <../../p/stud.scad>
use <../../p/stud3.scad>
$fa=1; $fs=0.2;
function ldraw_lib__s__3004s01(realsolid=false) = [
// 0 ~Brick  1 x  2 without Front Face
// 0 Name: s\3004s01.dat
// 0 Author: James Jessiman
// 0 !LDRAW_ORG Subpart UPDATE 2003-03
// 0 !LICENSE Licensed under CC BY 2.0 and CC BY 4.0 : see CAreadme.txt
// 
// 0 BFC CERTIFY CCW
  [0,"BFC","CERTIFY"],
  [0,"BFC","CCW"],
// 
// 0 !HISTORY 2003-09-07 [jriley] Subfiling, BFC
// 0 !HISTORY 2003-12-19 [PTadmin] Official Update 2003-03
// 0 !HISTORY 2007-08-29 [PTadmin] Header formatted for Contributor Agreement
// 0 !HISTORY 2008-07-01 [PTadmin] Official Update 2008-01
// 
// 
// 1 16 0 4 0 1 0 0 0 -5 0 0 0 1 stud3.dat
  [1,16,0,4,0,1,0,0,0,-5,0,0,0,1, ldraw_lib__stud3(realsolid)],
// 0 BFC INVERTNEXT
  [0,"BFC","INVERTNEXT"],
// 1 16 0 24 0 16 0 0 0 -20 0 0 0 6 box5.dat
  [1,16,0,24,0,16,0,0,0,-20,0,0,0,6, ldraw_lib__box5(realsolid)],
// 4 16 20 24 10 16 24 6 -16 24 6 -20 24 10
  [4,16,20,24,10,16,24,6,-16,24,6,-20,24,10],
// 4 16 -20 24 10 -16 24 6 -16 24 -6 -20 24 -10
  [4,16,-20,24,10,-16,24,6,-16,24,-6,-20,24,-10],
// 4 16 -20 24 -10 -16 24 -6 16 24 -6 20 24 -10
  [4,16,-20,24,-10,-16,24,-6,16,24,-6,20,24,-10],
// 4 16 20 24 -10 16 24 -6 16 24 6 20 24 10
  [4,16,20,24,-10,16,24,-6,16,24,6,20,24,10],
// 1 16 0 24 0 20 0 0 0 -24 0 0 0 10 box4t.dat
  [1,16,0,24,0,20,0,0,0,-24,0,0,0,10, ldraw_lib__box4t(realsolid)],
// 1 16 10 0 0 1 0 0 0 1 0 0 0 1 stud.dat
  [1,16,10,0,0,1,0,0,0,1,0,0,0,1, ldraw_lib__stud(realsolid)],
// 1 16 -10 0 0 1 0 0 0 1 0 0 0 1 stud.dat
  [1,16,-10,0,0,1,0,0,0,1,0,0,0,1, ldraw_lib__stud(realsolid)],
// 0
];
module ldraw_lib__s__3004s01(step=0, col=false, unit=2/5, alt=false, line=0.2, solid=!$preview)
    makepoly(ldraw_lib__s__3004s01(solid), step=step, col=col, unit=unit, alt=alt, line=line, solid=solid);
ldraw_lib__s__3004s01(line=0.2);
// file: s/3005s01.scad
use <../../lib.scad>
use <../../p/box4t.scad>
use <../../p/box5.scad>
use <../../p/stud.scad>
$fa=1; $fs=0.2;
function ldraw_lib__s__3005s01(realsolid=false) = [
// 0 ~Brick  1 x  1 without Front Face
// 0 Name: s\3005s01.dat
// 0 Author: John Riley [jriley]
// 0 !LDRAW_ORG Subpart UPDATE 2004-01
// 0 !LICENSE Licensed under CC BY 2.0 and CC BY 4.0 : see CAreadme.txt
// 
// 0 BFC CERTIFY CCW
  [0,"BFC","CERTIFY"],
  [0,"BFC","CCW"],
// 
// 0 !HISTORY 2003-09-07 [jriley] BFCed & Subfiled
// 0 !HISTORY 2004-03-02 [PTadmin] Official Update 2004-01
// 0 !HISTORY 2007-08-29 [PTadmin] Header formatted for Contributor Agreement
// 0 !HISTORY 2008-07-01 [PTadmin] Official Update 2008-01
// 
// 
// 0 BFC INVERTNEXT
  [0,"BFC","INVERTNEXT"],
// 1 16 0 24 0 0 0 6 0 -20 0 -6 0 0 box5.dat
  [1,16,0,24,0,0,0,6,0,-20,0,-6,0,0, ldraw_lib__box5(realsolid)],
// 4 16 10 24 -10 6 24 -6 6 24 6 10 24 10
  [4,16,10,24,-10,6,24,-6,6,24,6,10,24,10],
// 4 16 10 24 10 6 24 6 -6 24 6 -10 24 10
  [4,16,10,24,10,6,24,6,-6,24,6,-10,24,10],
// 4 16 -10 24 10 -6 24 6 -6 24 -6 -10 24 -10
  [4,16,-10,24,10,-6,24,6,-6,24,-6,-10,24,-10],
// 4 16 -10 24 -10 -6 24 -6 6 24 -6 10 24 -10
  [4,16,-10,24,-10,-6,24,-6,6,24,-6,10,24,-10],
// 1 16 0 24 0 10 0 0 0 -24 0 0 0 10 box4t.dat
  [1,16,0,24,0,10,0,0,0,-24,0,0,0,10, ldraw_lib__box4t(realsolid)],
// 1 16 0 0 0 0 0 1 0 1 0 -1 0 0 stud.dat
  [1,16,0,0,0,0,0,1,0,1,0,-1,0,0, ldraw_lib__stud(realsolid)],
// 0
];
module ldraw_lib__s__3005s01(step=0, col=false, unit=2/5, alt=false, line=0.2, solid=!$preview)
    makepoly(ldraw_lib__s__3005s01(solid), step=step, col=col, unit=unit, alt=alt, line=line, solid=solid);
ldraw_lib__s__3005s01(line=0.2);
// file: 3004.scad
use <../lib.scad>
use <s/3004s01.scad>
$fa=1; $fs=0.2;
function ldraw_lib__3004(realsolid=false) = [
// 0 Brick  1 x  2
// 0 Name: 3004.dat
// 0 Author: James Jessiman
// 0 !LDRAW_ORG Part UPDATE 2022-05
// 0 !LICENSE Licensed under CC BY 2.0 and CC BY 4.0 : see CAreadme.txt
// 
// 0 BFC CERTIFY CCW
  [0,"BFC","CERTIFY"],
  [0,"BFC","CCW"],
// 
// 0 !HISTORY 2001-10-26 [PTadmin] Official Update 2001-01
// 0 !HISTORY 2002-05-07 {unknown} BFC Certification
// 0 !HISTORY 2002-06-11 [PTadmin] Official Update 2002-03
// 0 !HISTORY 2007-05-07 [PTadmin] Header formatted for Contributor Agreement
// 0 !HISTORY 2008-07-01 [PTadmin] Official Update 2008-01
// 0 !HISTORY 2022-08-04 [MagFors] Using subfile
// 0 !HISTORY 2022-09-15 [PTadmin] Official Update 2022-05
// 
// 
// 1 16 0 0 0 1 0 0 0 1 0 0 0 1 s\3004s01.dat
  [1,16,0,0,0,1,0,0,0,1,0,0,0,1, ldraw_lib__s__3004s01(realsolid)],
// 4 16 -20 24 -10 20 24 -10 20 0 -10 -20 0 -10
  [4,16,-20,24,-10,20,24,-10,20,0,-10,-20,0,-10],
];
module ldraw_lib__3004(step=0, col=false, unit=2/5, alt=false, line=0.2, solid=!$preview)
    makepoly(ldraw_lib__3004(solid), step=step, col=col, unit=unit, alt=alt, line=line, solid=solid);
ldraw_lib__3004(line=0.2);
// file: 3005pt2.scad
use <../lib.scad>
use <s/3005s01.scad>
$fa=1; $fs=0.2;
function ldraw_lib__3005pt2(realsolid=false) = [
// 0 Brick  1 x  1 with Blue "2" Pattern
// 0 Name: 3005pt2.dat
// 0 Author: Tore Eriksson [Tore_Eriksson]
// 0 !LDRAW_ORG Part UPDATE 2004-02
// 0 !LICENSE Licensed under CC BY 2.0 and CC BY 4.0 : see CAreadme.txt
// 
// 0 BFC CERTIFY CCW
  [0,"BFC","CERTIFY"],
  [0,"BFC","CCW"],
// 
// 0 !HISTORY 2003-06-08 [jriley] BFC compliant
// 0 !HISTORY 2004-04-22 [PTadmin] Official Update 2004-02
// 0 !HISTORY 2007-05-11 [PTadmin] Header formatted for Contributor Agreement
// 0 !HISTORY 2008-07-01 [PTadmin] Official Update 2008-01
// 
// 
// 1 16 0 0 0 1 0 0 0 1 0 0 0 1 s\3005s01.dat
  [1,16,0,0,0,1,0,0,0,1,0,0,0,1, ldraw_lib__s__3005s01(realsolid)],
// 4 1 -4.45 7.7 -10 -3.1 9.65 -10 -0.5 8 -10 -2.15 6.8 -10
  [4,1,-4.45,7.7,-10,-3.1,9.65,-10,-0.5,8,-10,-2.15,6.8,-10],
// 4 1 -2.15 6.8 -10 -0.5 8 -10 1.2 8 -10 0.35 6.1 -10
  [4,1,-2.15,6.8,-10,-0.5,8,-10,1.2,8,-10,0.35,6.1,-10],
// 4 1 0.35 6.1 -10 1.2 8 -10 2.1 8.35 -10 2.75 6.5 -10
  [4,1,0.35,6.1,-10,1.2,8,-10,2.1,8.35,-10,2.75,6.5,-10],
// 4 1 2.75 6.5 -10 2.1 8.35 -10 2.5 8.8 -10 4.2 7.6 -10
  [4,1,2.75,6.5,-10,2.1,8.35,-10,2.5,8.8,-10,4.2,7.6,-10],
// 4 1 4.2 7.6 -10 2.5 8.8 -10 2.6 9.4 -10 4.7 9.3 -10
  [4,1,4.2,7.6,-10,2.5,8.8,-10,2.6,9.4,-10,4.7,9.3,-10],
// 4 1 4.7 9.3 -10 2.6 9.4 -10 2.35 10.35 -10 4.3 10.85 -10
  [4,1,4.7,9.3,-10,2.6,9.4,-10,2.35,10.35,-10,4.3,10.85,-10],
// 4 1 4.3 10.85 -10 2.35 10.35 -10 1.2 11.25 -10 2.85 12.35 -10
  [4,1,4.3,10.85,-10,2.35,10.35,-10,1.2,11.25,-10,2.85,12.35,-10],
// 4 1 2.85 12.35 -10 1.2 11.25 -10 -1.45 12.75 -10 0.15 13.9 -10
  [4,1,2.85,12.35,-10,1.2,11.25,-10,-1.45,12.75,-10,0.15,13.9,-10],
// 4 1 0.15 13.9 -10 -1.45 12.75 -10 -2.55 13.6 -10 -1.05 14.65 -10
  [4,1,0.15,13.9,-10,-1.45,12.75,-10,-2.55,13.6,-10,-1.05,14.65,-10],
// 4 1 -1.05 14.65 -10 -2.55 13.6 -10 -3.55 15.6 -10 -1.45 15.2 -10
  [4,1,-1.05,14.65,-10,-2.55,13.6,-10,-3.55,15.6,-10,-1.45,15.2,-10],
// 4 1 -1.45 15.2 -10 -3.55 15.6 -10 -3.85 16.85 -10 0.7 16.85 -10
  [4,1,-1.45,15.2,-10,-3.55,15.6,-10,-3.85,16.85,-10,0.7,16.85,-10],
// 4 1 -1.45 15.2 -10 0.7 16.85 -10 4.65 17.1 -10 4.8 15.25 -10
  [4,1,-1.45,15.2,-10,0.7,16.85,-10,4.65,17.1,-10,4.8,15.25,-10],
// 4 1 4.8 15.25 -10 4.65 17.1 -10 5.4 17.2 -10 5.3 15 -10
  [4,1,4.8,15.25,-10,4.65,17.1,-10,5.4,17.2,-10,5.3,15,-10],
// 4 16 4.3 10.85 -10 2.85 12.35 -10 4.8 15.25 -10 5.3 15 -10
  [4,16,4.3,10.85,-10,2.85,12.35,-10,4.8,15.25,-10,5.3,15,-10],
// 3 16 2.85 12.35 -10 0.15 13.9 -10 4.8 15.25 -10
  [3,16,2.85,12.35,-10,0.15,13.9,-10,4.8,15.25,-10],
// 4 16 0.15 13.9 -10 -1.05 14.65 -10 -1.45 15.2 -10 4.8 15.25 -10
  [4,16,0.15,13.9,-10,-1.05,14.65,-10,-1.45,15.2,-10,4.8,15.25,-10],
// 3 16 -4.45 7.7 -10 -3.85 16.85 -10 -3.55 15.6 -10
  [3,16,-4.45,7.7,-10,-3.85,16.85,-10,-3.55,15.6,-10],
// 4 16 -4.45 7.7 -10 -3.55 15.6 -10 -2.55 13.6 -10 -3.1 9.65 -10
  [4,16,-4.45,7.7,-10,-3.55,15.6,-10,-2.55,13.6,-10,-3.1,9.65,-10],
// 4 16 -2.55 13.6 -10 -1.45 12.75 -10 -0.5 8 -10 -3.1 9.65 -10
  [4,16,-2.55,13.6,-10,-1.45,12.75,-10,-0.5,8,-10,-3.1,9.65,-10],
// 4 16 -1.45 12.75 -10 1.2 11.25 -10 1.2 8 -10 -0.5 8 -10
  [4,16,-1.45,12.75,-10,1.2,11.25,-10,1.2,8,-10,-0.5,8,-10],
// 4 16 1.2 11.25 -10 2.35 10.35 -10 2.1 8.35 -10 1.2 8 -10
  [4,16,1.2,11.25,-10,2.35,10.35,-10,2.1,8.35,-10,1.2,8,-10],
// 4 16 2.35 10.35 -10 2.6 9.4 -10 2.5 8.8 -10 2.1 8.35 -10
  [4,16,2.35,10.35,-10,2.6,9.4,-10,2.5,8.8,-10,2.1,8.35,-10],
// 3 16 -10 0 -10 -4.45 7.7 -10 -2.15 6.8 -10
  [3,16,-10,0,-10,-4.45,7.7,-10,-2.15,6.8,-10],
// 4 16 -10 0 -10 -2.15 6.8 -10 0.35 6.1 -10 10 0 -10
  [4,16,-10,0,-10,-2.15,6.8,-10,0.35,6.1,-10,10,0,-10],
// 3 16 10 0 -10 0.35 6.1 -10 2.75 6.5 -10
  [3,16,10,0,-10,0.35,6.1,-10,2.75,6.5,-10],
// 3 16 10 0 -10 2.75 6.5 -10 4.2 7.6 -10
  [3,16,10,0,-10,2.75,6.5,-10,4.2,7.6,-10],
// 3 16 10 0 -10 4.2 7.6 -10 4.7 9.3 -10
  [3,16,10,0,-10,4.2,7.6,-10,4.7,9.3,-10],
// 4 16 10 0 -10 4.7 9.3 -10 4.3 10.85 -10 5.3 15 -10
  [4,16,10,0,-10,4.7,9.3,-10,4.3,10.85,-10,5.3,15,-10],
// 4 16 10 0 -10 4.3 10.85 -10 5.3 15 -10 10 24 -10
  [4,16,10,0,-10,4.3,10.85,-10,5.3,15,-10,10,24,-10],
// 3 16 10 24 -10 5.3 15 -10 5.4 17.2 -10
  [3,16,10,24,-10,5.3,15,-10,5.4,17.2,-10],
// 4 16 10 24 -10 5.4 17.2 -10 4.65 17.1 -10 0.7 16.85 -10
  [4,16,10,24,-10,5.4,17.2,-10,4.65,17.1,-10,0.7,16.85,-10],
// 4 16 10 24 -10 0.7 16.85 -10 -3.85 16.85 -10 -10 24 -10
  [4,16,10,24,-10,0.7,16.85,-10,-3.85,16.85,-10,-10,24,-10],
// 4 16 -10 24 -10 -3.85 16.85 -10 -4.45 7.7 -10 -10 0 -10
  [4,16,-10,24,-10,-3.85,16.85,-10,-4.45,7.7,-10,-10,0,-10],
// 0
];
module ldraw_lib__3005pt2(step=0, col=false, unit=2/5, alt=false, line=0.2, solid=!$preview)
    makepoly(ldraw_lib__3005pt2(solid), step=step, col=col, unit=unit, alt=alt, line=line, solid=solid);
ldraw_lib__3005pt2(line=0.2);
// main file
use <../lib.scad>
use <3005pt2.scad>
$fa=1; $fs=0.2;
function ldraw_lib__3005_2(realsolid=false) = [
// 0 ~Moved to 3005pt2
// 0 Name: 3005-2.dat
// 0 Author: [PTadmin]
// 0 !LDRAW_ORG Part UPDATE 2004-02
// 0 !LICENSE Licensed under CC BY 4.0 : see CAreadme.txt
// 
// 0 BFC CERTIFY CCW
  [0,"BFC","CERTIFY"],
  [0,"BFC","CCW"],
// 
// 0 !HISTORY 1998-12-15 [PTadmin] Official Update 1998-10
// 0 !HISTORY 2004-04-22 [PTadmin] Official Update 2004-02
// 0 !HISTORY 2007-05-11 [PTadmin] Header formatted for Contributor Agreement
// 0 !HISTORY 2008-07-01 [PTadmin] Official Update 2008-01
// 
// 
// 1 16 0 0 0 1 0 0 0 1 0 0 0 1 3005pt2.dat
  [1,16,0,0,0,1,0,0,0,1,0,0,0,1, ldraw_lib__3005pt2(realsolid)],
];
module ldraw_lib__3005_2(step=0, col=false, unit=2/5, alt=false, line=0.2, solid=!$preview)
    makepoly(ldraw_lib__3005_2(solid), step=step, col=col, unit=unit, alt=alt, line=line, solid=solid);
ldraw_lib__3005_2(line=0.2);
